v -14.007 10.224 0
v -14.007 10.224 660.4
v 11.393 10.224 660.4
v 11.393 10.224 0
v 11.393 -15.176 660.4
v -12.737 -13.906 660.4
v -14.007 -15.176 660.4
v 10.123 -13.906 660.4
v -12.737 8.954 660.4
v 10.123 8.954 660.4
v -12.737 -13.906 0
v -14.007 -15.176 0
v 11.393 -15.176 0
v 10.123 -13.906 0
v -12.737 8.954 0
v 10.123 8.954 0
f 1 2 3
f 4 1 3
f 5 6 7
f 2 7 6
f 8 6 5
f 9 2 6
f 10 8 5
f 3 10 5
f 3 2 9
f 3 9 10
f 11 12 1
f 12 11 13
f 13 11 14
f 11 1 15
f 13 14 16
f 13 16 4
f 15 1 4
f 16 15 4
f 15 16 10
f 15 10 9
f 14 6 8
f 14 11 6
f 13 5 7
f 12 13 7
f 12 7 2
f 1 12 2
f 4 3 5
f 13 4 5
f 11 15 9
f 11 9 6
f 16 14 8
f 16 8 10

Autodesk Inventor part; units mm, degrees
ref_plane "YZ Plane" through (0, 0, 0) normal (1, 0, 0) x (0, 1, 0)
ref_plane "XZ Plane" through (0, 0, 0) normal (0, 1, 0) x (-1, 0, 0)
ref_plane "XY Plane" through (0, 0, 0) normal (0, 0, 1) x (1, 0, 0)
sketch "Sketch1" plane through (0, 0, 0) normal (0, 0, 1) x (1, 0, 0)
  line L0 (-14.0074, 10.2243) -> (11.3926, 10.2243)
  line L1 (11.3926, 10.2243) -> (11.3926, -15.1757)
  line L2 (11.3926, -15.1757) -> (-14.0074, -15.1757)
  line L3 (-14.0074, -15.1757) -> (-14.0074, 10.2243)
  line L4 (10.1226, 8.9543) -> (-12.7374, 8.9543)
  line L5 (-12.7374, 8.9543) -> (-12.7374, -13.9057)
  line L6 (-12.7374, -13.9057) -> (10.1226, -13.9057)
  line L7 (10.1226, -13.9057) -> (10.1226, 8.9543)
  point P0 (0, 0)
  dimension "d0" = 25.4
  dimension "d1" = 1.27
extrude "Extrusion2" add sketch "Sketch1" along normal blind 660.4
equation "\"d4\" = d2"
equation "\"d2\" = 660.4"
properties part number "1x1 Stock 26in"
